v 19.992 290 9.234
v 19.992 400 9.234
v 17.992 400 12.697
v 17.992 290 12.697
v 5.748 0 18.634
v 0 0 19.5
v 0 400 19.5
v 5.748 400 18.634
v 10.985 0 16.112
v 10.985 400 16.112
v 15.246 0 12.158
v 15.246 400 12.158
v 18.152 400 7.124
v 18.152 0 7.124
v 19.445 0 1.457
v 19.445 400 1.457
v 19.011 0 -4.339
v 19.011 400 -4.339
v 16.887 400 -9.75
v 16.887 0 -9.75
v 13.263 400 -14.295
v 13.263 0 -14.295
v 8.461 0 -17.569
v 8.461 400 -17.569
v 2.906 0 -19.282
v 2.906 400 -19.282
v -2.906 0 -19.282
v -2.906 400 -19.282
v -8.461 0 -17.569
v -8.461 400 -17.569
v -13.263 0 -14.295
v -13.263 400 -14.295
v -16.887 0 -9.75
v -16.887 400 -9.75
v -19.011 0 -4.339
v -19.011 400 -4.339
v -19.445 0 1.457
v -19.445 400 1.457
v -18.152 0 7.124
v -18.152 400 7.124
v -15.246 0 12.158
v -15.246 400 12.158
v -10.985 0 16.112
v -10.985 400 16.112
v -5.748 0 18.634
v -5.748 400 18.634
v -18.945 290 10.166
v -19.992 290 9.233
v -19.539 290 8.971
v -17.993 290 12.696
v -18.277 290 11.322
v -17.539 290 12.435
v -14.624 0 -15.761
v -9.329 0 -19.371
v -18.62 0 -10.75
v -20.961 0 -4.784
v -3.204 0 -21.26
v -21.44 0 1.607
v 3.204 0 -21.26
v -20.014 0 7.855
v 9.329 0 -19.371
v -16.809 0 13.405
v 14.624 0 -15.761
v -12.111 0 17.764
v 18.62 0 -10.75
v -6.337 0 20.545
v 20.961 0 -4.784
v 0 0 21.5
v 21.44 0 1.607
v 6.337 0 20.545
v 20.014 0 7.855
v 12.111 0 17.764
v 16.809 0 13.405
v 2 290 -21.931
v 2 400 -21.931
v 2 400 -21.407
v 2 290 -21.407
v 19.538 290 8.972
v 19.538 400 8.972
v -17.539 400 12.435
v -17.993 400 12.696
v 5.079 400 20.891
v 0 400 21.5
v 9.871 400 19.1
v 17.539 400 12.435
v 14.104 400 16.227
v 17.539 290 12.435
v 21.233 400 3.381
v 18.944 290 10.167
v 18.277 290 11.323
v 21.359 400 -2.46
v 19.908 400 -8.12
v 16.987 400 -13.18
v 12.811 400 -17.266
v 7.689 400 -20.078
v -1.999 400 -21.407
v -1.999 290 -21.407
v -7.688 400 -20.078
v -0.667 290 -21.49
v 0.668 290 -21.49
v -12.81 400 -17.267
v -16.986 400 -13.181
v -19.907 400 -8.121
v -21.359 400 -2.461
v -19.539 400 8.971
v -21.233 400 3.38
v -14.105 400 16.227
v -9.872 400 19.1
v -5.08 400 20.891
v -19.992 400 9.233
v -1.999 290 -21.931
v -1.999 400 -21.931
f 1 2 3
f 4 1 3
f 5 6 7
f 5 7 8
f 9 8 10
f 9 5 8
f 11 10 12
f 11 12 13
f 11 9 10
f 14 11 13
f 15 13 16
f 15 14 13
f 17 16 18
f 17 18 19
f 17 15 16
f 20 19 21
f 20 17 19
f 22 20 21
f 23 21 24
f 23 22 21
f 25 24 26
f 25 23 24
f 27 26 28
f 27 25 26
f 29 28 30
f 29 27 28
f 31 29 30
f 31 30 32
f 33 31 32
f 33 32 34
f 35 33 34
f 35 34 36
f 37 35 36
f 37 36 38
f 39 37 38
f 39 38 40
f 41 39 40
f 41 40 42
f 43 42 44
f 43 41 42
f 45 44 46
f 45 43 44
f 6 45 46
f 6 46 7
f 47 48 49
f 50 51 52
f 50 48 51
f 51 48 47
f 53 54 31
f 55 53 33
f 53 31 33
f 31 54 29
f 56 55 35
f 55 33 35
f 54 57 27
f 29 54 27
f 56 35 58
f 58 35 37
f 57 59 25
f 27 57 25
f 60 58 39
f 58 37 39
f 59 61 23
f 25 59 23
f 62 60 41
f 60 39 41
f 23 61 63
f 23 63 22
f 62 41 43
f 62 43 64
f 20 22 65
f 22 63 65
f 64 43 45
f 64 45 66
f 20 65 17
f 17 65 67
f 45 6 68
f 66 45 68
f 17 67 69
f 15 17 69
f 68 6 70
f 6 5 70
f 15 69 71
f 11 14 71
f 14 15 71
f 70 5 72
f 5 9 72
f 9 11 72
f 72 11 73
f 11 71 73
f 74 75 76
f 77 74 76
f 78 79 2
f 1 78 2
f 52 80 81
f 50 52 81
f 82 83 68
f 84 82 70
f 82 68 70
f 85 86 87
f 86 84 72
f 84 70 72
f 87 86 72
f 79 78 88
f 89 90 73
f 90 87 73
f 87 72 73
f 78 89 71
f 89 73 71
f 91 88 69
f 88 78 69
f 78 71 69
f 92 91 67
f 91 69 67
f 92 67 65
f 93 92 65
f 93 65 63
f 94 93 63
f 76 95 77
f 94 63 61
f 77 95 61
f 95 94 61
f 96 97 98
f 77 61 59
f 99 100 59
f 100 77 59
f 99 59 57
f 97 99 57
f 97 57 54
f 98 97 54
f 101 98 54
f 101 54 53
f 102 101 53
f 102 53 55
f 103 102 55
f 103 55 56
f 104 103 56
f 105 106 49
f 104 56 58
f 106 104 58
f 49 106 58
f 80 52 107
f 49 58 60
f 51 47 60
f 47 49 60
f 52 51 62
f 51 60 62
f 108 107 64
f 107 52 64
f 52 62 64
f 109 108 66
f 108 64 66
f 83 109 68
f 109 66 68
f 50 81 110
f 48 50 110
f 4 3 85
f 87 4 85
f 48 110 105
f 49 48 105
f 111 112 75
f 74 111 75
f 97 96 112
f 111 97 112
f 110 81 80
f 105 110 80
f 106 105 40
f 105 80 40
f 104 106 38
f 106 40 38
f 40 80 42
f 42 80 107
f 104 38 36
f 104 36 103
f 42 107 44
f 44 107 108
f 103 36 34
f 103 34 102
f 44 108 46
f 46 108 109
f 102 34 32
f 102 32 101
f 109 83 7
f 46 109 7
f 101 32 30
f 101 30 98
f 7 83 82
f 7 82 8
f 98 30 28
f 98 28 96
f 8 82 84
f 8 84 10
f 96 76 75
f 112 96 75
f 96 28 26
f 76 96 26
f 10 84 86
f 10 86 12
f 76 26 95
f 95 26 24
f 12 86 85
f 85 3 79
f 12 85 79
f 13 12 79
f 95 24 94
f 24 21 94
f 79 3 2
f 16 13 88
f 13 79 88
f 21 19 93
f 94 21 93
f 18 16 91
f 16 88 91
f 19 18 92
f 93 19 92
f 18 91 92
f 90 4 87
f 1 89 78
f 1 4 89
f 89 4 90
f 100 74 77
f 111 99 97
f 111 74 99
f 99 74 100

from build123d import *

# Parameters (mm, degrees)
ESBO_O1_R                = 21.5
ESBO_O1_R_2              = 19.5
RESSALTO_EXTRUS_O1_DEPTH = 400
RESSALTO_EXTRUS_O3_DEPTH = 110
PADR_OCIRCULAR2_COUNT    = 3


with BuildPart() as part:
    # Esboço1 → Ressalto-extrusão1 (new body)
    with BuildSketch(Plane(origin=(0, 0, 0), x_dir=(1, 0, 0), z_dir=(0, 1, 0))):
        with Locations(Location((0, 0, 0), (0, 0, 270))):
            Circle(ESBO_O1_R)
        with Locations(Location((0, 0, 0), (0, 0, 270))):
            Circle(ESBO_O1_R_2, mode=Mode.SUBTRACT)
    extrude(amount=RESSALTO_EXTRUS_O1_DEPTH)

    # Esboço2 → Ressalto-extrusão3 (add)
    with BuildSketch(Plane(origin=(0, 400, 0), x_dir=(1, 0, 0), z_dir=(0, 1, 0))):
        Polygon((2, 21.930506272), (2, 21.234864033), (0, 21.5), (-1.998917515, 21.234864033), (-1.998917515, 21.930506272), align=None)
    ressalto_extrus_o3 = extrude(amount=-RESSALTO_EXTRUS_O3_DEPTH)

    # PadrãoCircular2: Ressalto-extrusão3 ×3 about axis
    padr_ocircular2_axis = Axis((0, 0, 0), (0, 1, 0))
    for i in range(1, PADR_OCIRCULAR2_COUNT):
        add(ressalto_extrus_o3.rotate(padr_ocircular2_axis, i * 360 / PADR_OCIRCULAR2_COUNT))


solid = part.part
